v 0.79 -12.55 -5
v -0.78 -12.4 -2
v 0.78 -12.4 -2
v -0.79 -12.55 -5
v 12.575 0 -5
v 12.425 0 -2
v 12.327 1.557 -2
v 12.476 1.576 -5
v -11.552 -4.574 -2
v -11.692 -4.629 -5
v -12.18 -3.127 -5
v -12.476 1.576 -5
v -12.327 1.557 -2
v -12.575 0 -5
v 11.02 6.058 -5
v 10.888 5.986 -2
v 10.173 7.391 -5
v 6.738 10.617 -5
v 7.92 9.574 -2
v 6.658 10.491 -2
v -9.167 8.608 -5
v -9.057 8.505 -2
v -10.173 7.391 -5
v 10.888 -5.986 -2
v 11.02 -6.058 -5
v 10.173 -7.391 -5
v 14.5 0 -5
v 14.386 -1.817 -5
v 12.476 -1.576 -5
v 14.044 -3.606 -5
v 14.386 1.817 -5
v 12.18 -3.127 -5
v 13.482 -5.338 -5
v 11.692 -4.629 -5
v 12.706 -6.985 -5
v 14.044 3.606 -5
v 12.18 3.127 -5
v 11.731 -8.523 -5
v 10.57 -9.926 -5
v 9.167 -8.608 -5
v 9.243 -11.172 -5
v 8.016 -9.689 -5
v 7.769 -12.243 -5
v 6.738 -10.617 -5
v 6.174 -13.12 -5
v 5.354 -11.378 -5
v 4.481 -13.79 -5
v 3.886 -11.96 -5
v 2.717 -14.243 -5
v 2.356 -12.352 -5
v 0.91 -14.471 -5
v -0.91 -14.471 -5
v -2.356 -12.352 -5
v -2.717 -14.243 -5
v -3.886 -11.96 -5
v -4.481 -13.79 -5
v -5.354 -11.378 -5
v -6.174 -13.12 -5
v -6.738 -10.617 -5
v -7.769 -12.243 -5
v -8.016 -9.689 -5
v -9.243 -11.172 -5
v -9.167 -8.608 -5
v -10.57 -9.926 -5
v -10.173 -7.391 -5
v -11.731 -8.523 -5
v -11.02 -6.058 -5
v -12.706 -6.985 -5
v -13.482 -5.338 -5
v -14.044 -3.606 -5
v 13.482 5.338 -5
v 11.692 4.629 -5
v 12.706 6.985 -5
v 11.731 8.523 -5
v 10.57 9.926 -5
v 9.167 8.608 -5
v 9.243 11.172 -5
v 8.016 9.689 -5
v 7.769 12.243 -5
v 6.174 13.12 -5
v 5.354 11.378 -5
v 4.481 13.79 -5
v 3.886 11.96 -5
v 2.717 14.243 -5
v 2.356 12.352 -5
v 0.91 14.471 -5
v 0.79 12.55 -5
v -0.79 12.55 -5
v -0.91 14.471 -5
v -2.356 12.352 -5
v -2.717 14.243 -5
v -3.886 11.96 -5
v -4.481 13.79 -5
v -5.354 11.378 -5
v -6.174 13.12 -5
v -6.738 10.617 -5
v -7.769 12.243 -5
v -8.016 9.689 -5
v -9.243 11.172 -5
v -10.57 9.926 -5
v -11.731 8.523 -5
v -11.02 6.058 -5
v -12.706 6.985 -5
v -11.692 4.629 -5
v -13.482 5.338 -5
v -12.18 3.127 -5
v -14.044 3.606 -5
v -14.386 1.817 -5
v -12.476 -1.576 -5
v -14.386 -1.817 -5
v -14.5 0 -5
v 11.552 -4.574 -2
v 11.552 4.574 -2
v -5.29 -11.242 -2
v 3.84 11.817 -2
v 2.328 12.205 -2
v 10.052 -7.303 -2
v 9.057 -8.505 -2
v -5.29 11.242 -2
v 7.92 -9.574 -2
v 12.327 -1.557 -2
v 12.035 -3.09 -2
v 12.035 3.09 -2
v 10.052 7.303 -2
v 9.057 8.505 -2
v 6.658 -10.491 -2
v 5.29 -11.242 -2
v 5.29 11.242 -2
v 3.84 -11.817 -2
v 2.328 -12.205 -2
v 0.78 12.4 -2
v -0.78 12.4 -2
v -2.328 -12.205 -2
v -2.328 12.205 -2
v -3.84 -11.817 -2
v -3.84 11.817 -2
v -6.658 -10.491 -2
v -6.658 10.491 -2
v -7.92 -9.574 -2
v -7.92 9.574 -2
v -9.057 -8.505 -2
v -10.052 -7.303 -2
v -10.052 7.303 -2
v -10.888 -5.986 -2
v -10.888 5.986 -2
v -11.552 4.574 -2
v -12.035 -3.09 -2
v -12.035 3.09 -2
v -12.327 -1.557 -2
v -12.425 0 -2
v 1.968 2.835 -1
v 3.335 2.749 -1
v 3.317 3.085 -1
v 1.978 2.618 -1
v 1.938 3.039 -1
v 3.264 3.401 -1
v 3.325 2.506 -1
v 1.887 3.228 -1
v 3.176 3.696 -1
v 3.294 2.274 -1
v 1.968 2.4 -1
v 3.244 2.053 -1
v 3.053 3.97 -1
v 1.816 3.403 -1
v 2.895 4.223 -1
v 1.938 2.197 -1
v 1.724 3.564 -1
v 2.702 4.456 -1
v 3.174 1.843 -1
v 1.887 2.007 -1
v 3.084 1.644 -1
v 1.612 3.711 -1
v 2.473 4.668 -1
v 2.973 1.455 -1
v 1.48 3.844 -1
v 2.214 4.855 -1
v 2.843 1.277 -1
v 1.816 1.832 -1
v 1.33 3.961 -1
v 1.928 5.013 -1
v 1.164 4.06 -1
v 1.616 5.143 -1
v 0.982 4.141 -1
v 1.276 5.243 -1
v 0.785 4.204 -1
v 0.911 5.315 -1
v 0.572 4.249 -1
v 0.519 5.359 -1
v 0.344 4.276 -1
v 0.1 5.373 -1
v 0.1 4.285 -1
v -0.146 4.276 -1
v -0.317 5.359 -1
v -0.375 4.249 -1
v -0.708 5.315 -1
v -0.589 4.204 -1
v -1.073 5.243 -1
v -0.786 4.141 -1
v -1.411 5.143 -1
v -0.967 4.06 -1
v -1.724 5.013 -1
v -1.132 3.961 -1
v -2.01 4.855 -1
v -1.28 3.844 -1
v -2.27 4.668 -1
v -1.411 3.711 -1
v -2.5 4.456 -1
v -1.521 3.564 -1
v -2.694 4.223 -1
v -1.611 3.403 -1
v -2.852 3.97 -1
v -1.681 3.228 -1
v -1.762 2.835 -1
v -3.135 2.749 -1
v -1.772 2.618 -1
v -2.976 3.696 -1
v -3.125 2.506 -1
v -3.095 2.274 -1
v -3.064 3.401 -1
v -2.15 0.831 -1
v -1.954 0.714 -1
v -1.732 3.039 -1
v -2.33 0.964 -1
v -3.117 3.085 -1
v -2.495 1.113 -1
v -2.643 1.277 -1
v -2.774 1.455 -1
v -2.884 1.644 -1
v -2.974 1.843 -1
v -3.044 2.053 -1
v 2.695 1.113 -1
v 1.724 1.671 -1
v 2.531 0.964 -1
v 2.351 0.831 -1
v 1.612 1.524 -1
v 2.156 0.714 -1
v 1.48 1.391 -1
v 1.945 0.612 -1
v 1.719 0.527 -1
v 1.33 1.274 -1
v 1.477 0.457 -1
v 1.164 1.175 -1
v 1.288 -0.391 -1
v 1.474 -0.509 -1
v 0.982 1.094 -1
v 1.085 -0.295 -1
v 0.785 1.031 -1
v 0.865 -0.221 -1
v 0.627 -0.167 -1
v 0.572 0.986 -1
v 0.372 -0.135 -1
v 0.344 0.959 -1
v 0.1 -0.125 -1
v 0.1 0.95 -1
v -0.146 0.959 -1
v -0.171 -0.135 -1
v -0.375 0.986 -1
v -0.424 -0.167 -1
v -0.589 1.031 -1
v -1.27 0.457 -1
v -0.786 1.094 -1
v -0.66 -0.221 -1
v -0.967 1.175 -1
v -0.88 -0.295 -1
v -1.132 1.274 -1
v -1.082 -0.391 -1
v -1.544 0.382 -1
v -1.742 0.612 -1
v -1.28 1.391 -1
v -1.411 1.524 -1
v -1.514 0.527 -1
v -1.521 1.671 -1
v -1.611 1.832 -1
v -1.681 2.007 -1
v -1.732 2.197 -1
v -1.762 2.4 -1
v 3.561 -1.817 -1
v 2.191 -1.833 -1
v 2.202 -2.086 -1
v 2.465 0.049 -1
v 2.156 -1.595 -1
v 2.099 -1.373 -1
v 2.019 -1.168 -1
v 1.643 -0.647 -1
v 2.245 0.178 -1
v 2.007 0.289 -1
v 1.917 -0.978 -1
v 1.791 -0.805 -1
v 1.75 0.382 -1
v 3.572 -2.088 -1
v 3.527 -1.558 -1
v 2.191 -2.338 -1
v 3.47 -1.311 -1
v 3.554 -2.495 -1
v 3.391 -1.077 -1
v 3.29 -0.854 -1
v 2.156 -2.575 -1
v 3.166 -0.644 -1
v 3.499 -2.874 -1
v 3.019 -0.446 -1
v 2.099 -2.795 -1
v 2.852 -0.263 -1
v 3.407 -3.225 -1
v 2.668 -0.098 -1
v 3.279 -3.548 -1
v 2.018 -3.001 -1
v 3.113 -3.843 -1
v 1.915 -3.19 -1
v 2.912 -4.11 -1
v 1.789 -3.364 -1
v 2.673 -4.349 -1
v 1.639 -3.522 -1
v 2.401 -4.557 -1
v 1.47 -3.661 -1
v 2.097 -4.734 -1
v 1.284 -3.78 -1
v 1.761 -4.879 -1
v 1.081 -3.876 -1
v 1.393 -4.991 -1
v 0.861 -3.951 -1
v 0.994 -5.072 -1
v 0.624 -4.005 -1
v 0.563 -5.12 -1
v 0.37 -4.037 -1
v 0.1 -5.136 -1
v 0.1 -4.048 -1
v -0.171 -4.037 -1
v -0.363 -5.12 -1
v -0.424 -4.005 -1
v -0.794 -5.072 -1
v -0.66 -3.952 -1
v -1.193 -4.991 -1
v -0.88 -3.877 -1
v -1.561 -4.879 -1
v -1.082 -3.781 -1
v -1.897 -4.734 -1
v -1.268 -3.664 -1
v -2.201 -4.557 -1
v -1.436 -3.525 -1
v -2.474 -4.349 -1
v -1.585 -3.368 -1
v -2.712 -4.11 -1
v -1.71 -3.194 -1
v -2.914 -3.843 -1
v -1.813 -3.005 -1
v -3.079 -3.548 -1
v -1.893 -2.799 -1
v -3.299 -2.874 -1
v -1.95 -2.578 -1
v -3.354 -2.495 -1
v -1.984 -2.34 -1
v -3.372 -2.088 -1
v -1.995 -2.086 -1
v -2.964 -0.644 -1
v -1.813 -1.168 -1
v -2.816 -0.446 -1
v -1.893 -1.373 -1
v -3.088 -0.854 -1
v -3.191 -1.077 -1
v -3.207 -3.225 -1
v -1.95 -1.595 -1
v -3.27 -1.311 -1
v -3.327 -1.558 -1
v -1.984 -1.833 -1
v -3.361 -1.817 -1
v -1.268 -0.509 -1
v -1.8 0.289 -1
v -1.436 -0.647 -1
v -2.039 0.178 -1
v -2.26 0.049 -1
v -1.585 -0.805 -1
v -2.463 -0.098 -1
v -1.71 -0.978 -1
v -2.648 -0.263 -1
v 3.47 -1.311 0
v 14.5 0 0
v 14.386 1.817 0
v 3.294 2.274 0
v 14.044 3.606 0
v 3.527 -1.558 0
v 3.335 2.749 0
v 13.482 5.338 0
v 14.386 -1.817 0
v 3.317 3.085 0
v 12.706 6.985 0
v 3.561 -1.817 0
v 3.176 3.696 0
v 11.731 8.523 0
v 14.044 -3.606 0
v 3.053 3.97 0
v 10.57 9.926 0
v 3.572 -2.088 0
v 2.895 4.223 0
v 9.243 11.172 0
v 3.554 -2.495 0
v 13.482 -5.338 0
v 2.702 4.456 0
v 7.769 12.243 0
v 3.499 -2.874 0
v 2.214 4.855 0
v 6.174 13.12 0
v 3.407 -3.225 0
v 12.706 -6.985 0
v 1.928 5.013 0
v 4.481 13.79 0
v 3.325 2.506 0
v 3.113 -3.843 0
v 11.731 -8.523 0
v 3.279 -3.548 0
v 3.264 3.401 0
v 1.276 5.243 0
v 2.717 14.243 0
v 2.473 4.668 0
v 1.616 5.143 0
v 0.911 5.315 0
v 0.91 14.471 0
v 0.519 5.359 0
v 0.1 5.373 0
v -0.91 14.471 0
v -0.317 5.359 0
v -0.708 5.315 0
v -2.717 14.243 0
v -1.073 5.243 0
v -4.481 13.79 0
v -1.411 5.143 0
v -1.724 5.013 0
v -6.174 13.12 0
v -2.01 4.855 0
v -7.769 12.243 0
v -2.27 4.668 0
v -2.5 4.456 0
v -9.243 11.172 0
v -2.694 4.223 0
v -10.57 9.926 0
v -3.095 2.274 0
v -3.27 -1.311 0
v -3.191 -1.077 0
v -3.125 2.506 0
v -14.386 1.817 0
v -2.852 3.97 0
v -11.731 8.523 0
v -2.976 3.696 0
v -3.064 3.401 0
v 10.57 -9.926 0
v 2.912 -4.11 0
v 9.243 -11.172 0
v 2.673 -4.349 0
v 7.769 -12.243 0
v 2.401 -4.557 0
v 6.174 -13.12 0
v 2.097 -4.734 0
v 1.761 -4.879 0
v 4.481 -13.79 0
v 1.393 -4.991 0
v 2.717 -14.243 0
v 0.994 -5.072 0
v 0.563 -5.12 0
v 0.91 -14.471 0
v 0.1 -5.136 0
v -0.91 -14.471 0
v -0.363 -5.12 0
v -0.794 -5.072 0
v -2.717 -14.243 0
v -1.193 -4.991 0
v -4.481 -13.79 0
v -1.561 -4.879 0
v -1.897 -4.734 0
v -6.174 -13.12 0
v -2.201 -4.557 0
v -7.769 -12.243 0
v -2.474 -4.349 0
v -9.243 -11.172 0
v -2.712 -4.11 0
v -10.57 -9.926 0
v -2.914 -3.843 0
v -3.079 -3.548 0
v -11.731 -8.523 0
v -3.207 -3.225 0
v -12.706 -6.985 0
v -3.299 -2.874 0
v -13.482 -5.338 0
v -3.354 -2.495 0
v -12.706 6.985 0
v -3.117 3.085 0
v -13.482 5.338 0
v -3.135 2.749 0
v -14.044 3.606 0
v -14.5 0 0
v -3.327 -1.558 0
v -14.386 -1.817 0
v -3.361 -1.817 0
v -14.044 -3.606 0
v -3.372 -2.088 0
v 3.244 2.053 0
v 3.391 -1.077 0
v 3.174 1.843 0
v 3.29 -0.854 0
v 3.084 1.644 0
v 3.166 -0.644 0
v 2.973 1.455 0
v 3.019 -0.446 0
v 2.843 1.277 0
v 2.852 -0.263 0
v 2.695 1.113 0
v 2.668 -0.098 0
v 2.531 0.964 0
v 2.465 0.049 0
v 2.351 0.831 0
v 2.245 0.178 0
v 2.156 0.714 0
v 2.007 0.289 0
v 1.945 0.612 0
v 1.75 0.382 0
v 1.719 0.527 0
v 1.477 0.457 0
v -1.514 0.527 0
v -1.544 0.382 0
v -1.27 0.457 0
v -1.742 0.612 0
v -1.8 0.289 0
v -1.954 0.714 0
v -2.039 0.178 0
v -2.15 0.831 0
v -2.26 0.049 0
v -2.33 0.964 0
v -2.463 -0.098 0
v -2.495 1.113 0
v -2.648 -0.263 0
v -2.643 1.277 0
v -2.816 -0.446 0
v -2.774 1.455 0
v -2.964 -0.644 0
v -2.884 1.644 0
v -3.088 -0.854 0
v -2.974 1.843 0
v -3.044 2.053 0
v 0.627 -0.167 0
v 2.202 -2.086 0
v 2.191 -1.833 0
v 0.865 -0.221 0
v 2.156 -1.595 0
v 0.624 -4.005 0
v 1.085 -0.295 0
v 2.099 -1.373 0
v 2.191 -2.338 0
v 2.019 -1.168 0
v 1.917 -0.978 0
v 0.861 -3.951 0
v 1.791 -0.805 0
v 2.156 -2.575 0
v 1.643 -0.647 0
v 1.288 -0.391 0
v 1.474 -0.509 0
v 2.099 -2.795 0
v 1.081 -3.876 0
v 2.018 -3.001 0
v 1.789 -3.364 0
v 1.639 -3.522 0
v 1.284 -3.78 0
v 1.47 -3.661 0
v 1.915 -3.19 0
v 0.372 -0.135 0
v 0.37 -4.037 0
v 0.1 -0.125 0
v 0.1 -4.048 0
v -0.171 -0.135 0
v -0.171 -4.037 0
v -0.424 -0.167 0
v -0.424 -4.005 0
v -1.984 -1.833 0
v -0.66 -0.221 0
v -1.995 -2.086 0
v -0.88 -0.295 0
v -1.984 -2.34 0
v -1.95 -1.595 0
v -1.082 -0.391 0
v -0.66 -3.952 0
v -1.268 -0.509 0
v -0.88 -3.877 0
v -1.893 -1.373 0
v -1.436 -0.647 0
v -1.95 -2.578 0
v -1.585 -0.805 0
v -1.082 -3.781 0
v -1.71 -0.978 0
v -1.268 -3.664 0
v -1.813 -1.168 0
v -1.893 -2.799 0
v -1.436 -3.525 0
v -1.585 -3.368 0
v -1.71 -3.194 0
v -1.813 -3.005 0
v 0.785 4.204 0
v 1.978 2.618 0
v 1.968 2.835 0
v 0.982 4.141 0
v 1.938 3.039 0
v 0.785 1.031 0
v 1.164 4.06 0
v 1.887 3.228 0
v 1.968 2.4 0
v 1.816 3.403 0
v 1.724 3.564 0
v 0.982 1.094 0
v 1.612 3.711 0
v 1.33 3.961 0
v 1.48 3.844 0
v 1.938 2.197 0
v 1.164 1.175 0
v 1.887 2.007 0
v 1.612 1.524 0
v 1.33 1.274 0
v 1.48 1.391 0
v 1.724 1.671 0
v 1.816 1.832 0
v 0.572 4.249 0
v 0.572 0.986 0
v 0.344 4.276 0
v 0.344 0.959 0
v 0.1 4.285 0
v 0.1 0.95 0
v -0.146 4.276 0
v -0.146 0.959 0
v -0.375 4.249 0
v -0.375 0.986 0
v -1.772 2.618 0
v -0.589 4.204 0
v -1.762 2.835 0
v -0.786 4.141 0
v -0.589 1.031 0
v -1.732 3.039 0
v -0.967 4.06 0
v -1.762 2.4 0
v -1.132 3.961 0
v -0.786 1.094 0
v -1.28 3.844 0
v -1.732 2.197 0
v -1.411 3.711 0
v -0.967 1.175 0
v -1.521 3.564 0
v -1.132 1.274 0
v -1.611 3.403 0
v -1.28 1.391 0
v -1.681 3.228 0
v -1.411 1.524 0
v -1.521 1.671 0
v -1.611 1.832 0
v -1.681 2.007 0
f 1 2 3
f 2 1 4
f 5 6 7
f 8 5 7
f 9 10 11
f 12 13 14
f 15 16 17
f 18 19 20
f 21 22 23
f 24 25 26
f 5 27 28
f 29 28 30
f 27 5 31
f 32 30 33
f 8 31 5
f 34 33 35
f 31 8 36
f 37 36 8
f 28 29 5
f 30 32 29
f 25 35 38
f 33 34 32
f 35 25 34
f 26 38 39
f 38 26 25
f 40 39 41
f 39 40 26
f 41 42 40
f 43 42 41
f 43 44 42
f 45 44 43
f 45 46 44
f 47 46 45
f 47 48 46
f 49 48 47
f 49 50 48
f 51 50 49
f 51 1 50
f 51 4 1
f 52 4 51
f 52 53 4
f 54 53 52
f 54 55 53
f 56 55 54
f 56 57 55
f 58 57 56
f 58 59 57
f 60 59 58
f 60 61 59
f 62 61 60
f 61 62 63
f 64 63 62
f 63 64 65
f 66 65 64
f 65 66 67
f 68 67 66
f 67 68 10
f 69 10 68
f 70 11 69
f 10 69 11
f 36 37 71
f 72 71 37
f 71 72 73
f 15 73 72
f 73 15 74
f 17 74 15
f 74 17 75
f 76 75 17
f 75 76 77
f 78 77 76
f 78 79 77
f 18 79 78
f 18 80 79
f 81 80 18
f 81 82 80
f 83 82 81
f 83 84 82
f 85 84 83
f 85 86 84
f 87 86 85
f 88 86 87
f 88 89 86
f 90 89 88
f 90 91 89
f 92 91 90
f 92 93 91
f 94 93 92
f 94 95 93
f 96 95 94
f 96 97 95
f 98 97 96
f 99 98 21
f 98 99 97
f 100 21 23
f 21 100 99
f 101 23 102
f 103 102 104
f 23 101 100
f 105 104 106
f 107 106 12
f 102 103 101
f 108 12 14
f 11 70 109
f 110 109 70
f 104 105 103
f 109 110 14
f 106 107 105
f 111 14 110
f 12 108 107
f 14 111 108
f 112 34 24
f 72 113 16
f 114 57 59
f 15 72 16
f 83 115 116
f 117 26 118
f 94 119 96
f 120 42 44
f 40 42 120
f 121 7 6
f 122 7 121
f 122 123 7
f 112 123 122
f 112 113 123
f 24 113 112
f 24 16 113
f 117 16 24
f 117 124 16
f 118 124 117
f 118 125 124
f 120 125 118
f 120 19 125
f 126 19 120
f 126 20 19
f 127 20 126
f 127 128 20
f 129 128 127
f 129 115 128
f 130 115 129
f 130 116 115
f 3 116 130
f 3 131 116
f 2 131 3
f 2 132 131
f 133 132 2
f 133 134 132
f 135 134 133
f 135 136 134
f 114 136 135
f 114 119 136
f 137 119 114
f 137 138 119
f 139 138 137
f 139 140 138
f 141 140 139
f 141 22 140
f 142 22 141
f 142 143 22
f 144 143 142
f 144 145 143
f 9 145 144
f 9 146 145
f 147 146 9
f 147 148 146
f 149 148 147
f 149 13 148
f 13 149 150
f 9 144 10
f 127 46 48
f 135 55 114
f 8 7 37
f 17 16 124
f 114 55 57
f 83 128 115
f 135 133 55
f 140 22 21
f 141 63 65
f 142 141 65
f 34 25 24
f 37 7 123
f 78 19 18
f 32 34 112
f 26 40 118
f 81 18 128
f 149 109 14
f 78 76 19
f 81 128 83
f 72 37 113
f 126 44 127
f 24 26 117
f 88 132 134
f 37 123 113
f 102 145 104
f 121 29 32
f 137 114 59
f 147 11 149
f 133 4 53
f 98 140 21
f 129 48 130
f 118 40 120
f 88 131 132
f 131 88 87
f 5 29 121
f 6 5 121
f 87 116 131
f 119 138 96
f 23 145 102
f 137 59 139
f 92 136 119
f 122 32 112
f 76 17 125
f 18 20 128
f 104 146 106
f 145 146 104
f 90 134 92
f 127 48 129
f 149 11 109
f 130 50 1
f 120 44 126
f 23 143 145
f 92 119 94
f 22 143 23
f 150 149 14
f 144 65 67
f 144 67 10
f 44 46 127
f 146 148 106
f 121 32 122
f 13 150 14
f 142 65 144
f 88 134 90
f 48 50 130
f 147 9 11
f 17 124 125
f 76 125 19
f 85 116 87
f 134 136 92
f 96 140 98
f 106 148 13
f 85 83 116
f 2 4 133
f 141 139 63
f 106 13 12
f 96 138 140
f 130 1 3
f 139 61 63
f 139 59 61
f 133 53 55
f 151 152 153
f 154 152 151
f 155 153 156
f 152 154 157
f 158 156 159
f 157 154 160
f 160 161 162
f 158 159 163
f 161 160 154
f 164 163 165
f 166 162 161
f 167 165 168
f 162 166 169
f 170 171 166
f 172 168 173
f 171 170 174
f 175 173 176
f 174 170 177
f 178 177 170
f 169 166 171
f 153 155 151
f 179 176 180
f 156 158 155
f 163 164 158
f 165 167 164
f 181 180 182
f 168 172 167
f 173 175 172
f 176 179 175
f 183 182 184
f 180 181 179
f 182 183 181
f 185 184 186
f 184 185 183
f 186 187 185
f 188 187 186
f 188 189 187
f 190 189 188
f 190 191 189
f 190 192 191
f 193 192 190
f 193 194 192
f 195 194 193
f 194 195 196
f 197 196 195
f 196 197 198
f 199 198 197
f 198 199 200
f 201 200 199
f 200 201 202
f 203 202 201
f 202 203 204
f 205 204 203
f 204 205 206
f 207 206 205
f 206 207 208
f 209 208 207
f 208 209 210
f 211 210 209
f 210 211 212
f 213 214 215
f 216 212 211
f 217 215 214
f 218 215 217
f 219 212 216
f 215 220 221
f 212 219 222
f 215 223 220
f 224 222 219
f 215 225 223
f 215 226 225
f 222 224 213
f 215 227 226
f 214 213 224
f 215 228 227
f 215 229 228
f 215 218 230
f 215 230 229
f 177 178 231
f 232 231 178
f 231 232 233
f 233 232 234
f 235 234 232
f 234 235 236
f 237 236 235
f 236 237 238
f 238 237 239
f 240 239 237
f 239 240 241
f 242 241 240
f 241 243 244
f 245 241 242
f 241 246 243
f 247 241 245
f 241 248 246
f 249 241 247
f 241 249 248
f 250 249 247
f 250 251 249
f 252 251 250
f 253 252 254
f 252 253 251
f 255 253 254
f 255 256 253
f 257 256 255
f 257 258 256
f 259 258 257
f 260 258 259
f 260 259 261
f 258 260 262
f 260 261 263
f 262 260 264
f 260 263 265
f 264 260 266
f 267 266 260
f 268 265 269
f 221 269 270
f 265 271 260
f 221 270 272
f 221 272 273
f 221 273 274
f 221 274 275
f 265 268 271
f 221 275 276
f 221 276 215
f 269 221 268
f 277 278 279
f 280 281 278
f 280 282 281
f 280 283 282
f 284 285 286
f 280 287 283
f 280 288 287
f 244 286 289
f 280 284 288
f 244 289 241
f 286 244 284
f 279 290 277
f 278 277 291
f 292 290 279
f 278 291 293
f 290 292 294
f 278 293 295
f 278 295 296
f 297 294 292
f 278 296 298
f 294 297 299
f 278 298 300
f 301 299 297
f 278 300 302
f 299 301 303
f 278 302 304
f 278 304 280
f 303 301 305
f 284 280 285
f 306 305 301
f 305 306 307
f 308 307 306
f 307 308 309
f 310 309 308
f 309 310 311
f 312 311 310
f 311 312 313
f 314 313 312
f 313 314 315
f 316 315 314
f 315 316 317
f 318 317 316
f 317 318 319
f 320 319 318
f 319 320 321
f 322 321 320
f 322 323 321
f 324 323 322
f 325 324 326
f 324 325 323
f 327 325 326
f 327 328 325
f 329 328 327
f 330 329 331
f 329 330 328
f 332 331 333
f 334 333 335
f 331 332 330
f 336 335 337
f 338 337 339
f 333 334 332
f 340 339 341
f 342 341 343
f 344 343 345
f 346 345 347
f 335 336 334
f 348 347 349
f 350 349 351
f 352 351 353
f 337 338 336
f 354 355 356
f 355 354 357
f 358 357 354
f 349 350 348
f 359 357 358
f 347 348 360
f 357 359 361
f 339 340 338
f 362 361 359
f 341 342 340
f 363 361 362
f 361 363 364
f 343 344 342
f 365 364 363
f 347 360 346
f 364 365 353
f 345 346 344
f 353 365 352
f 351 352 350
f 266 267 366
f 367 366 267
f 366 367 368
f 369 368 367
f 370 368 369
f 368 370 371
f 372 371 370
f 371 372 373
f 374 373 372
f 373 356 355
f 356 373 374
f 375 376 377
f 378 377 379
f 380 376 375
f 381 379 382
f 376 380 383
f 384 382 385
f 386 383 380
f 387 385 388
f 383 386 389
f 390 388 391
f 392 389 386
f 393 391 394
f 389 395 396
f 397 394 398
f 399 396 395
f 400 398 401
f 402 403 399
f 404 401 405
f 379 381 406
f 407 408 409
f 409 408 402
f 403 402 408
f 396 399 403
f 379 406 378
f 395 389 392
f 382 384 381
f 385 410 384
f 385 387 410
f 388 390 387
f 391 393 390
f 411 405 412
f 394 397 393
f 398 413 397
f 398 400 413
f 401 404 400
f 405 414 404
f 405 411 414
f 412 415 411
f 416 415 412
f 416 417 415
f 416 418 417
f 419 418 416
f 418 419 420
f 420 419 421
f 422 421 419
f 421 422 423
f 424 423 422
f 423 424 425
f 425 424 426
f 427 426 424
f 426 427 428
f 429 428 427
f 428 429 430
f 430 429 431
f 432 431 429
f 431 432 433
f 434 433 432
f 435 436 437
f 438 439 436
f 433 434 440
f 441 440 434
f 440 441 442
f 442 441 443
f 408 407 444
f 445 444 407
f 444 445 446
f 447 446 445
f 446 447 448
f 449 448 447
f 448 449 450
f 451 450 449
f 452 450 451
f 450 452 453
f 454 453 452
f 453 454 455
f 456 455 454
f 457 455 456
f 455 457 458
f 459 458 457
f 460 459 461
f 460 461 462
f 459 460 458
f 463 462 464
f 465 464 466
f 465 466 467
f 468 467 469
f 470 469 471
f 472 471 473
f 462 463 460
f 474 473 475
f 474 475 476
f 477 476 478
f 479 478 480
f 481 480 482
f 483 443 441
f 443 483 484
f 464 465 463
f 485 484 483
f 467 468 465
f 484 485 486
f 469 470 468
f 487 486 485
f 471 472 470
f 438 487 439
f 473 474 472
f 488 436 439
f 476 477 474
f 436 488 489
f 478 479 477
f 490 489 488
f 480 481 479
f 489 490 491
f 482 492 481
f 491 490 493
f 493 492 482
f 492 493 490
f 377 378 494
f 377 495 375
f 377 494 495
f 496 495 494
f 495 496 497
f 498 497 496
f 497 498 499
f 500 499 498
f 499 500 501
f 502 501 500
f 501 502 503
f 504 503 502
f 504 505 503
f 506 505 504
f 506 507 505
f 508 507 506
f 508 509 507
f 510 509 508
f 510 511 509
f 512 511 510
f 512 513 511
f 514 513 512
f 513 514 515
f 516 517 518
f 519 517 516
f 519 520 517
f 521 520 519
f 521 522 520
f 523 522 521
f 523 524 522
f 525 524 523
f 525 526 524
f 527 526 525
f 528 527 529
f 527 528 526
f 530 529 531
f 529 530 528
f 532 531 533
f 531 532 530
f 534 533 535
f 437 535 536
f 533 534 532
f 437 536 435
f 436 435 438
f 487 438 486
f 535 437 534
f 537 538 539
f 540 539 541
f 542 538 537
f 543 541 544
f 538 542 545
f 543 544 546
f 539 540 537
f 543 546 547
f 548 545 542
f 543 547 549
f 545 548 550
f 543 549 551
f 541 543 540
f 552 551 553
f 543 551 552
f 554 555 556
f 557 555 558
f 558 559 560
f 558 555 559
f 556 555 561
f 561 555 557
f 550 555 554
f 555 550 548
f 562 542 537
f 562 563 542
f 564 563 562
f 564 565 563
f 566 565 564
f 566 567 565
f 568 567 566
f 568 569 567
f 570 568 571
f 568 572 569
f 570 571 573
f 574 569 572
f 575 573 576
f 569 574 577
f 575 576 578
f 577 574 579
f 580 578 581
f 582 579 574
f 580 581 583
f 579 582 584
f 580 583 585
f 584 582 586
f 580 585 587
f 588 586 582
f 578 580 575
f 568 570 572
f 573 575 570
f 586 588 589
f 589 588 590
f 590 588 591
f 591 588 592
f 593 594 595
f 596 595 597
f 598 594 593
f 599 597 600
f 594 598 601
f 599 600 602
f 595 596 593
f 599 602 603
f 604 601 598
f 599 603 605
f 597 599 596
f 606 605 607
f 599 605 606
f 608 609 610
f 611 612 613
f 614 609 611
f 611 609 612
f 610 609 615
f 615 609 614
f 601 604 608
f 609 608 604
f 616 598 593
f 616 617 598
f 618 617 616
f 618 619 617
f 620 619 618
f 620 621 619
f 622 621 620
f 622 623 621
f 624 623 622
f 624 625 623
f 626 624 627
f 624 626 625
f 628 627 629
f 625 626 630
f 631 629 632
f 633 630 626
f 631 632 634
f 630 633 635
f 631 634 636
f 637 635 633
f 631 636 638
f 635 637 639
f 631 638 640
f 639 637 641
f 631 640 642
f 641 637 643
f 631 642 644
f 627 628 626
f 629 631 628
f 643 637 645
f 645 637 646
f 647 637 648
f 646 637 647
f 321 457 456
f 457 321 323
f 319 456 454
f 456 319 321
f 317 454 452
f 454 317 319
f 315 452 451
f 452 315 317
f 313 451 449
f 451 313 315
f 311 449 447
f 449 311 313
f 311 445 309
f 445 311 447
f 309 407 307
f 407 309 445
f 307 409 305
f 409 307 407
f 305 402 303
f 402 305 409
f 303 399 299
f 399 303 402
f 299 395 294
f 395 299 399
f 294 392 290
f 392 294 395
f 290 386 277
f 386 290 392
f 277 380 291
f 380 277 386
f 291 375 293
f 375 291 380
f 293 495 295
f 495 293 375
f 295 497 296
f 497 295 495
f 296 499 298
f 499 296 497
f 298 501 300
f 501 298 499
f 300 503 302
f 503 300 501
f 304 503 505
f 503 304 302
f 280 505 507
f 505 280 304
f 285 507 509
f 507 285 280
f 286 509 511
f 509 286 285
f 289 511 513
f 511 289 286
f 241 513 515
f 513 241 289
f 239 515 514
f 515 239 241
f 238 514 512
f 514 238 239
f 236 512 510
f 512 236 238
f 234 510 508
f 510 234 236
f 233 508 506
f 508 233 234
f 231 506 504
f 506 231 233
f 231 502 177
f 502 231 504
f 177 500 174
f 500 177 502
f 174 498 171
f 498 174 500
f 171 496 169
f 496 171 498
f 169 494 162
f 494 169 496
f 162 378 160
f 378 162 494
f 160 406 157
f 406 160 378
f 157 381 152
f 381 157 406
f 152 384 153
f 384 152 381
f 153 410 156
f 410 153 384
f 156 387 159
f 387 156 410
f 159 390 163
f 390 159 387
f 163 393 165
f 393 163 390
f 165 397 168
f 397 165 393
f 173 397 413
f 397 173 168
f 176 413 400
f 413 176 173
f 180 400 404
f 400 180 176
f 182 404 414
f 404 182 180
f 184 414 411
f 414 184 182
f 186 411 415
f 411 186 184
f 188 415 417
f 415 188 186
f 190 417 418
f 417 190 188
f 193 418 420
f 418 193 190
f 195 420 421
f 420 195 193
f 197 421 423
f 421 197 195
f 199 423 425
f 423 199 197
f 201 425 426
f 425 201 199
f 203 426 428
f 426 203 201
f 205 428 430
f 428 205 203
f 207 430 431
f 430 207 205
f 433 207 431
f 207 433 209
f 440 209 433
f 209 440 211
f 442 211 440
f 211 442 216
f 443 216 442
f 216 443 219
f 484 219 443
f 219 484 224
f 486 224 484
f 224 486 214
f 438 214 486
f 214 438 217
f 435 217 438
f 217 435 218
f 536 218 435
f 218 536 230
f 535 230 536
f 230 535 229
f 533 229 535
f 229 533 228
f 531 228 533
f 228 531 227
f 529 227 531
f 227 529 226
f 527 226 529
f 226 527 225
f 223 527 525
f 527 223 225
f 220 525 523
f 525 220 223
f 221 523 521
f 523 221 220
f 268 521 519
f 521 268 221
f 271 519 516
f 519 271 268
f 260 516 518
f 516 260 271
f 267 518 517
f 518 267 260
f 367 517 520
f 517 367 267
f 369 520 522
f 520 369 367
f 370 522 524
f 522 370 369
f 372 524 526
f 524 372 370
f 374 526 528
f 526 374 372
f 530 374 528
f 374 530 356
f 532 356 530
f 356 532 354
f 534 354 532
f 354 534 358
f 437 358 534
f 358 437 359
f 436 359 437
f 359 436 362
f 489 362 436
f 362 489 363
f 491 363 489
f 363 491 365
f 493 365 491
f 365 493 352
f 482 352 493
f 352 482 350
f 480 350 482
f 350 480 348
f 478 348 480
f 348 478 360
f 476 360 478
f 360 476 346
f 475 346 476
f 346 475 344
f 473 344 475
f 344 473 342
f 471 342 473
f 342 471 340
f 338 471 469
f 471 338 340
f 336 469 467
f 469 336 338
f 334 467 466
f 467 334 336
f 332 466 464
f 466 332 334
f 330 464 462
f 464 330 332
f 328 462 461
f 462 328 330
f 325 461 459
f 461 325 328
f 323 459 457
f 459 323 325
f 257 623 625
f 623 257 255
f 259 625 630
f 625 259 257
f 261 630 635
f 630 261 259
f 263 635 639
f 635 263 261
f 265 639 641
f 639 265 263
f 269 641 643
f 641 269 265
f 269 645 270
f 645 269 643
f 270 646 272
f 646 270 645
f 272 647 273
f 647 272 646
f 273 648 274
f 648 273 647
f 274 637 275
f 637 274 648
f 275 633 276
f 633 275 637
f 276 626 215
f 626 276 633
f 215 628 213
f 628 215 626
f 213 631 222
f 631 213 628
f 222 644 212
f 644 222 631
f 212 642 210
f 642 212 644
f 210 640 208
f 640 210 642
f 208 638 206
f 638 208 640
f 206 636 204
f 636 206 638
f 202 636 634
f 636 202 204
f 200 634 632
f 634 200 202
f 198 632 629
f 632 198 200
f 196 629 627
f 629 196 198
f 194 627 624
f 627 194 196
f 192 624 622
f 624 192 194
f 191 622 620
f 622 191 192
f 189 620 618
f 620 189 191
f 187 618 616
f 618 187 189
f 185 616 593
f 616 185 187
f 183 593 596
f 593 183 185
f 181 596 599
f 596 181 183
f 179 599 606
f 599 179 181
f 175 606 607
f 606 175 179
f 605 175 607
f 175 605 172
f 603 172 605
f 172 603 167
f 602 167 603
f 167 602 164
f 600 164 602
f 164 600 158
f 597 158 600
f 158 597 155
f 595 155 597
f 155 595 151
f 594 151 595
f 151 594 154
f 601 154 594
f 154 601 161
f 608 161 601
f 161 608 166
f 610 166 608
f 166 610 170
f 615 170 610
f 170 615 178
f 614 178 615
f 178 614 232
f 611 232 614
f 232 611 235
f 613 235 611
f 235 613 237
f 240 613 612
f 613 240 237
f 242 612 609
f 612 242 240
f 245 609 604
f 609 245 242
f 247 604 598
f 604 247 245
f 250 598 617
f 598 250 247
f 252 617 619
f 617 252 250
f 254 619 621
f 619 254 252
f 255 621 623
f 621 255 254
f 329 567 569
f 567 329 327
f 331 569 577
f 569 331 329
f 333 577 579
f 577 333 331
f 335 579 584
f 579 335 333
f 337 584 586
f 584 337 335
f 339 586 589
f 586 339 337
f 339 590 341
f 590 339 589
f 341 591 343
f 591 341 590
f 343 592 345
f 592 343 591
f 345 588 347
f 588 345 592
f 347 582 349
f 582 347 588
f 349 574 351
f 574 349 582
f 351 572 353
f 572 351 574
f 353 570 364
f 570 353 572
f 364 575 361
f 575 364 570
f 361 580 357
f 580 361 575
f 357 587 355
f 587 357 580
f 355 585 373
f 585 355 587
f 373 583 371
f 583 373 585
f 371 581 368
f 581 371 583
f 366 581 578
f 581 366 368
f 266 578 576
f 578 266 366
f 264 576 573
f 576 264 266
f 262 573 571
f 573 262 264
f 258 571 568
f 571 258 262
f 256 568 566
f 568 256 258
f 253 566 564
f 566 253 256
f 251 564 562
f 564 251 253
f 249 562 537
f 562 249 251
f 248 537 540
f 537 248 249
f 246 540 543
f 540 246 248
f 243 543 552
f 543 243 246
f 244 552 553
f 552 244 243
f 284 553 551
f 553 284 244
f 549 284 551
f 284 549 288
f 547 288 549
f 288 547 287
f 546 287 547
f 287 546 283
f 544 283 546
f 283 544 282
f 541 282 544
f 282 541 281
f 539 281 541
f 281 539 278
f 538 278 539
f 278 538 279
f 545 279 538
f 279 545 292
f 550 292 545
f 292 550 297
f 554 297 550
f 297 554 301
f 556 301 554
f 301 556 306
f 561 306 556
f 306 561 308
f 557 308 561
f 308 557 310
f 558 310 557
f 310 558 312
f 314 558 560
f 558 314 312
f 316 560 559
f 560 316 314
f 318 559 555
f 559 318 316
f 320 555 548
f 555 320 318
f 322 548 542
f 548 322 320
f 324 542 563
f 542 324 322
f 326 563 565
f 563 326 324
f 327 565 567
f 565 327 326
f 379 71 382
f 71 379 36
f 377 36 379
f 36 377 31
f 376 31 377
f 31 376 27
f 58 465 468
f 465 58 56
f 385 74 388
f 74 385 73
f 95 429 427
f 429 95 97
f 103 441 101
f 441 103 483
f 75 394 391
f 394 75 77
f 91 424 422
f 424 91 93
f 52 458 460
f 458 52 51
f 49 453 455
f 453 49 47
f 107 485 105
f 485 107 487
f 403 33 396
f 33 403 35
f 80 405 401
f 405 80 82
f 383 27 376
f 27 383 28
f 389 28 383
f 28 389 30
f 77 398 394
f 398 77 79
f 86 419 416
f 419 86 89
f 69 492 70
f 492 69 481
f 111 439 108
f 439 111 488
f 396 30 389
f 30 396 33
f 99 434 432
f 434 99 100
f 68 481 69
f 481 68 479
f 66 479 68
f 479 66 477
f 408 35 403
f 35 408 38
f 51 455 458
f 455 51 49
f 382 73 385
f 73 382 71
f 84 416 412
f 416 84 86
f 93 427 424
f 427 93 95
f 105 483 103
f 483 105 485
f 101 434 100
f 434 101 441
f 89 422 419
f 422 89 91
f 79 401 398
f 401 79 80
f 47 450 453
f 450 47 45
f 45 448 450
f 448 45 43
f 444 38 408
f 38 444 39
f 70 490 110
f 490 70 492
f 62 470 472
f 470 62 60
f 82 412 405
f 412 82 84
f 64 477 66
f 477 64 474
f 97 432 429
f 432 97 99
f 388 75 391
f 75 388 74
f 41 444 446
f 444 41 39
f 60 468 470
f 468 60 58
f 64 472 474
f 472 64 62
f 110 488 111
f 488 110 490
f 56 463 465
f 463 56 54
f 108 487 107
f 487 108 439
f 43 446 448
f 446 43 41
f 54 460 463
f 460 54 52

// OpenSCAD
$fn = 50;


difference() {
	union() {
		translate(v = [0, 0, -5.0000000000]) {
			cylinder(h = 5, r = 14.5000000000);
		}
	}
	union() {
		#translate(v = [0, 0, -5.0000000000]) {
			cylinder(h = 3, r1 = 12.5750000000, r2 = 12.4250000000);
		}
		translate(v = [0, 0, -1]) {
			linear_extrude(height = 1) {
				text(font = "Impact", halign = "center", size = 10, text = "8", valign = "center");
			}
		}
	}
}
